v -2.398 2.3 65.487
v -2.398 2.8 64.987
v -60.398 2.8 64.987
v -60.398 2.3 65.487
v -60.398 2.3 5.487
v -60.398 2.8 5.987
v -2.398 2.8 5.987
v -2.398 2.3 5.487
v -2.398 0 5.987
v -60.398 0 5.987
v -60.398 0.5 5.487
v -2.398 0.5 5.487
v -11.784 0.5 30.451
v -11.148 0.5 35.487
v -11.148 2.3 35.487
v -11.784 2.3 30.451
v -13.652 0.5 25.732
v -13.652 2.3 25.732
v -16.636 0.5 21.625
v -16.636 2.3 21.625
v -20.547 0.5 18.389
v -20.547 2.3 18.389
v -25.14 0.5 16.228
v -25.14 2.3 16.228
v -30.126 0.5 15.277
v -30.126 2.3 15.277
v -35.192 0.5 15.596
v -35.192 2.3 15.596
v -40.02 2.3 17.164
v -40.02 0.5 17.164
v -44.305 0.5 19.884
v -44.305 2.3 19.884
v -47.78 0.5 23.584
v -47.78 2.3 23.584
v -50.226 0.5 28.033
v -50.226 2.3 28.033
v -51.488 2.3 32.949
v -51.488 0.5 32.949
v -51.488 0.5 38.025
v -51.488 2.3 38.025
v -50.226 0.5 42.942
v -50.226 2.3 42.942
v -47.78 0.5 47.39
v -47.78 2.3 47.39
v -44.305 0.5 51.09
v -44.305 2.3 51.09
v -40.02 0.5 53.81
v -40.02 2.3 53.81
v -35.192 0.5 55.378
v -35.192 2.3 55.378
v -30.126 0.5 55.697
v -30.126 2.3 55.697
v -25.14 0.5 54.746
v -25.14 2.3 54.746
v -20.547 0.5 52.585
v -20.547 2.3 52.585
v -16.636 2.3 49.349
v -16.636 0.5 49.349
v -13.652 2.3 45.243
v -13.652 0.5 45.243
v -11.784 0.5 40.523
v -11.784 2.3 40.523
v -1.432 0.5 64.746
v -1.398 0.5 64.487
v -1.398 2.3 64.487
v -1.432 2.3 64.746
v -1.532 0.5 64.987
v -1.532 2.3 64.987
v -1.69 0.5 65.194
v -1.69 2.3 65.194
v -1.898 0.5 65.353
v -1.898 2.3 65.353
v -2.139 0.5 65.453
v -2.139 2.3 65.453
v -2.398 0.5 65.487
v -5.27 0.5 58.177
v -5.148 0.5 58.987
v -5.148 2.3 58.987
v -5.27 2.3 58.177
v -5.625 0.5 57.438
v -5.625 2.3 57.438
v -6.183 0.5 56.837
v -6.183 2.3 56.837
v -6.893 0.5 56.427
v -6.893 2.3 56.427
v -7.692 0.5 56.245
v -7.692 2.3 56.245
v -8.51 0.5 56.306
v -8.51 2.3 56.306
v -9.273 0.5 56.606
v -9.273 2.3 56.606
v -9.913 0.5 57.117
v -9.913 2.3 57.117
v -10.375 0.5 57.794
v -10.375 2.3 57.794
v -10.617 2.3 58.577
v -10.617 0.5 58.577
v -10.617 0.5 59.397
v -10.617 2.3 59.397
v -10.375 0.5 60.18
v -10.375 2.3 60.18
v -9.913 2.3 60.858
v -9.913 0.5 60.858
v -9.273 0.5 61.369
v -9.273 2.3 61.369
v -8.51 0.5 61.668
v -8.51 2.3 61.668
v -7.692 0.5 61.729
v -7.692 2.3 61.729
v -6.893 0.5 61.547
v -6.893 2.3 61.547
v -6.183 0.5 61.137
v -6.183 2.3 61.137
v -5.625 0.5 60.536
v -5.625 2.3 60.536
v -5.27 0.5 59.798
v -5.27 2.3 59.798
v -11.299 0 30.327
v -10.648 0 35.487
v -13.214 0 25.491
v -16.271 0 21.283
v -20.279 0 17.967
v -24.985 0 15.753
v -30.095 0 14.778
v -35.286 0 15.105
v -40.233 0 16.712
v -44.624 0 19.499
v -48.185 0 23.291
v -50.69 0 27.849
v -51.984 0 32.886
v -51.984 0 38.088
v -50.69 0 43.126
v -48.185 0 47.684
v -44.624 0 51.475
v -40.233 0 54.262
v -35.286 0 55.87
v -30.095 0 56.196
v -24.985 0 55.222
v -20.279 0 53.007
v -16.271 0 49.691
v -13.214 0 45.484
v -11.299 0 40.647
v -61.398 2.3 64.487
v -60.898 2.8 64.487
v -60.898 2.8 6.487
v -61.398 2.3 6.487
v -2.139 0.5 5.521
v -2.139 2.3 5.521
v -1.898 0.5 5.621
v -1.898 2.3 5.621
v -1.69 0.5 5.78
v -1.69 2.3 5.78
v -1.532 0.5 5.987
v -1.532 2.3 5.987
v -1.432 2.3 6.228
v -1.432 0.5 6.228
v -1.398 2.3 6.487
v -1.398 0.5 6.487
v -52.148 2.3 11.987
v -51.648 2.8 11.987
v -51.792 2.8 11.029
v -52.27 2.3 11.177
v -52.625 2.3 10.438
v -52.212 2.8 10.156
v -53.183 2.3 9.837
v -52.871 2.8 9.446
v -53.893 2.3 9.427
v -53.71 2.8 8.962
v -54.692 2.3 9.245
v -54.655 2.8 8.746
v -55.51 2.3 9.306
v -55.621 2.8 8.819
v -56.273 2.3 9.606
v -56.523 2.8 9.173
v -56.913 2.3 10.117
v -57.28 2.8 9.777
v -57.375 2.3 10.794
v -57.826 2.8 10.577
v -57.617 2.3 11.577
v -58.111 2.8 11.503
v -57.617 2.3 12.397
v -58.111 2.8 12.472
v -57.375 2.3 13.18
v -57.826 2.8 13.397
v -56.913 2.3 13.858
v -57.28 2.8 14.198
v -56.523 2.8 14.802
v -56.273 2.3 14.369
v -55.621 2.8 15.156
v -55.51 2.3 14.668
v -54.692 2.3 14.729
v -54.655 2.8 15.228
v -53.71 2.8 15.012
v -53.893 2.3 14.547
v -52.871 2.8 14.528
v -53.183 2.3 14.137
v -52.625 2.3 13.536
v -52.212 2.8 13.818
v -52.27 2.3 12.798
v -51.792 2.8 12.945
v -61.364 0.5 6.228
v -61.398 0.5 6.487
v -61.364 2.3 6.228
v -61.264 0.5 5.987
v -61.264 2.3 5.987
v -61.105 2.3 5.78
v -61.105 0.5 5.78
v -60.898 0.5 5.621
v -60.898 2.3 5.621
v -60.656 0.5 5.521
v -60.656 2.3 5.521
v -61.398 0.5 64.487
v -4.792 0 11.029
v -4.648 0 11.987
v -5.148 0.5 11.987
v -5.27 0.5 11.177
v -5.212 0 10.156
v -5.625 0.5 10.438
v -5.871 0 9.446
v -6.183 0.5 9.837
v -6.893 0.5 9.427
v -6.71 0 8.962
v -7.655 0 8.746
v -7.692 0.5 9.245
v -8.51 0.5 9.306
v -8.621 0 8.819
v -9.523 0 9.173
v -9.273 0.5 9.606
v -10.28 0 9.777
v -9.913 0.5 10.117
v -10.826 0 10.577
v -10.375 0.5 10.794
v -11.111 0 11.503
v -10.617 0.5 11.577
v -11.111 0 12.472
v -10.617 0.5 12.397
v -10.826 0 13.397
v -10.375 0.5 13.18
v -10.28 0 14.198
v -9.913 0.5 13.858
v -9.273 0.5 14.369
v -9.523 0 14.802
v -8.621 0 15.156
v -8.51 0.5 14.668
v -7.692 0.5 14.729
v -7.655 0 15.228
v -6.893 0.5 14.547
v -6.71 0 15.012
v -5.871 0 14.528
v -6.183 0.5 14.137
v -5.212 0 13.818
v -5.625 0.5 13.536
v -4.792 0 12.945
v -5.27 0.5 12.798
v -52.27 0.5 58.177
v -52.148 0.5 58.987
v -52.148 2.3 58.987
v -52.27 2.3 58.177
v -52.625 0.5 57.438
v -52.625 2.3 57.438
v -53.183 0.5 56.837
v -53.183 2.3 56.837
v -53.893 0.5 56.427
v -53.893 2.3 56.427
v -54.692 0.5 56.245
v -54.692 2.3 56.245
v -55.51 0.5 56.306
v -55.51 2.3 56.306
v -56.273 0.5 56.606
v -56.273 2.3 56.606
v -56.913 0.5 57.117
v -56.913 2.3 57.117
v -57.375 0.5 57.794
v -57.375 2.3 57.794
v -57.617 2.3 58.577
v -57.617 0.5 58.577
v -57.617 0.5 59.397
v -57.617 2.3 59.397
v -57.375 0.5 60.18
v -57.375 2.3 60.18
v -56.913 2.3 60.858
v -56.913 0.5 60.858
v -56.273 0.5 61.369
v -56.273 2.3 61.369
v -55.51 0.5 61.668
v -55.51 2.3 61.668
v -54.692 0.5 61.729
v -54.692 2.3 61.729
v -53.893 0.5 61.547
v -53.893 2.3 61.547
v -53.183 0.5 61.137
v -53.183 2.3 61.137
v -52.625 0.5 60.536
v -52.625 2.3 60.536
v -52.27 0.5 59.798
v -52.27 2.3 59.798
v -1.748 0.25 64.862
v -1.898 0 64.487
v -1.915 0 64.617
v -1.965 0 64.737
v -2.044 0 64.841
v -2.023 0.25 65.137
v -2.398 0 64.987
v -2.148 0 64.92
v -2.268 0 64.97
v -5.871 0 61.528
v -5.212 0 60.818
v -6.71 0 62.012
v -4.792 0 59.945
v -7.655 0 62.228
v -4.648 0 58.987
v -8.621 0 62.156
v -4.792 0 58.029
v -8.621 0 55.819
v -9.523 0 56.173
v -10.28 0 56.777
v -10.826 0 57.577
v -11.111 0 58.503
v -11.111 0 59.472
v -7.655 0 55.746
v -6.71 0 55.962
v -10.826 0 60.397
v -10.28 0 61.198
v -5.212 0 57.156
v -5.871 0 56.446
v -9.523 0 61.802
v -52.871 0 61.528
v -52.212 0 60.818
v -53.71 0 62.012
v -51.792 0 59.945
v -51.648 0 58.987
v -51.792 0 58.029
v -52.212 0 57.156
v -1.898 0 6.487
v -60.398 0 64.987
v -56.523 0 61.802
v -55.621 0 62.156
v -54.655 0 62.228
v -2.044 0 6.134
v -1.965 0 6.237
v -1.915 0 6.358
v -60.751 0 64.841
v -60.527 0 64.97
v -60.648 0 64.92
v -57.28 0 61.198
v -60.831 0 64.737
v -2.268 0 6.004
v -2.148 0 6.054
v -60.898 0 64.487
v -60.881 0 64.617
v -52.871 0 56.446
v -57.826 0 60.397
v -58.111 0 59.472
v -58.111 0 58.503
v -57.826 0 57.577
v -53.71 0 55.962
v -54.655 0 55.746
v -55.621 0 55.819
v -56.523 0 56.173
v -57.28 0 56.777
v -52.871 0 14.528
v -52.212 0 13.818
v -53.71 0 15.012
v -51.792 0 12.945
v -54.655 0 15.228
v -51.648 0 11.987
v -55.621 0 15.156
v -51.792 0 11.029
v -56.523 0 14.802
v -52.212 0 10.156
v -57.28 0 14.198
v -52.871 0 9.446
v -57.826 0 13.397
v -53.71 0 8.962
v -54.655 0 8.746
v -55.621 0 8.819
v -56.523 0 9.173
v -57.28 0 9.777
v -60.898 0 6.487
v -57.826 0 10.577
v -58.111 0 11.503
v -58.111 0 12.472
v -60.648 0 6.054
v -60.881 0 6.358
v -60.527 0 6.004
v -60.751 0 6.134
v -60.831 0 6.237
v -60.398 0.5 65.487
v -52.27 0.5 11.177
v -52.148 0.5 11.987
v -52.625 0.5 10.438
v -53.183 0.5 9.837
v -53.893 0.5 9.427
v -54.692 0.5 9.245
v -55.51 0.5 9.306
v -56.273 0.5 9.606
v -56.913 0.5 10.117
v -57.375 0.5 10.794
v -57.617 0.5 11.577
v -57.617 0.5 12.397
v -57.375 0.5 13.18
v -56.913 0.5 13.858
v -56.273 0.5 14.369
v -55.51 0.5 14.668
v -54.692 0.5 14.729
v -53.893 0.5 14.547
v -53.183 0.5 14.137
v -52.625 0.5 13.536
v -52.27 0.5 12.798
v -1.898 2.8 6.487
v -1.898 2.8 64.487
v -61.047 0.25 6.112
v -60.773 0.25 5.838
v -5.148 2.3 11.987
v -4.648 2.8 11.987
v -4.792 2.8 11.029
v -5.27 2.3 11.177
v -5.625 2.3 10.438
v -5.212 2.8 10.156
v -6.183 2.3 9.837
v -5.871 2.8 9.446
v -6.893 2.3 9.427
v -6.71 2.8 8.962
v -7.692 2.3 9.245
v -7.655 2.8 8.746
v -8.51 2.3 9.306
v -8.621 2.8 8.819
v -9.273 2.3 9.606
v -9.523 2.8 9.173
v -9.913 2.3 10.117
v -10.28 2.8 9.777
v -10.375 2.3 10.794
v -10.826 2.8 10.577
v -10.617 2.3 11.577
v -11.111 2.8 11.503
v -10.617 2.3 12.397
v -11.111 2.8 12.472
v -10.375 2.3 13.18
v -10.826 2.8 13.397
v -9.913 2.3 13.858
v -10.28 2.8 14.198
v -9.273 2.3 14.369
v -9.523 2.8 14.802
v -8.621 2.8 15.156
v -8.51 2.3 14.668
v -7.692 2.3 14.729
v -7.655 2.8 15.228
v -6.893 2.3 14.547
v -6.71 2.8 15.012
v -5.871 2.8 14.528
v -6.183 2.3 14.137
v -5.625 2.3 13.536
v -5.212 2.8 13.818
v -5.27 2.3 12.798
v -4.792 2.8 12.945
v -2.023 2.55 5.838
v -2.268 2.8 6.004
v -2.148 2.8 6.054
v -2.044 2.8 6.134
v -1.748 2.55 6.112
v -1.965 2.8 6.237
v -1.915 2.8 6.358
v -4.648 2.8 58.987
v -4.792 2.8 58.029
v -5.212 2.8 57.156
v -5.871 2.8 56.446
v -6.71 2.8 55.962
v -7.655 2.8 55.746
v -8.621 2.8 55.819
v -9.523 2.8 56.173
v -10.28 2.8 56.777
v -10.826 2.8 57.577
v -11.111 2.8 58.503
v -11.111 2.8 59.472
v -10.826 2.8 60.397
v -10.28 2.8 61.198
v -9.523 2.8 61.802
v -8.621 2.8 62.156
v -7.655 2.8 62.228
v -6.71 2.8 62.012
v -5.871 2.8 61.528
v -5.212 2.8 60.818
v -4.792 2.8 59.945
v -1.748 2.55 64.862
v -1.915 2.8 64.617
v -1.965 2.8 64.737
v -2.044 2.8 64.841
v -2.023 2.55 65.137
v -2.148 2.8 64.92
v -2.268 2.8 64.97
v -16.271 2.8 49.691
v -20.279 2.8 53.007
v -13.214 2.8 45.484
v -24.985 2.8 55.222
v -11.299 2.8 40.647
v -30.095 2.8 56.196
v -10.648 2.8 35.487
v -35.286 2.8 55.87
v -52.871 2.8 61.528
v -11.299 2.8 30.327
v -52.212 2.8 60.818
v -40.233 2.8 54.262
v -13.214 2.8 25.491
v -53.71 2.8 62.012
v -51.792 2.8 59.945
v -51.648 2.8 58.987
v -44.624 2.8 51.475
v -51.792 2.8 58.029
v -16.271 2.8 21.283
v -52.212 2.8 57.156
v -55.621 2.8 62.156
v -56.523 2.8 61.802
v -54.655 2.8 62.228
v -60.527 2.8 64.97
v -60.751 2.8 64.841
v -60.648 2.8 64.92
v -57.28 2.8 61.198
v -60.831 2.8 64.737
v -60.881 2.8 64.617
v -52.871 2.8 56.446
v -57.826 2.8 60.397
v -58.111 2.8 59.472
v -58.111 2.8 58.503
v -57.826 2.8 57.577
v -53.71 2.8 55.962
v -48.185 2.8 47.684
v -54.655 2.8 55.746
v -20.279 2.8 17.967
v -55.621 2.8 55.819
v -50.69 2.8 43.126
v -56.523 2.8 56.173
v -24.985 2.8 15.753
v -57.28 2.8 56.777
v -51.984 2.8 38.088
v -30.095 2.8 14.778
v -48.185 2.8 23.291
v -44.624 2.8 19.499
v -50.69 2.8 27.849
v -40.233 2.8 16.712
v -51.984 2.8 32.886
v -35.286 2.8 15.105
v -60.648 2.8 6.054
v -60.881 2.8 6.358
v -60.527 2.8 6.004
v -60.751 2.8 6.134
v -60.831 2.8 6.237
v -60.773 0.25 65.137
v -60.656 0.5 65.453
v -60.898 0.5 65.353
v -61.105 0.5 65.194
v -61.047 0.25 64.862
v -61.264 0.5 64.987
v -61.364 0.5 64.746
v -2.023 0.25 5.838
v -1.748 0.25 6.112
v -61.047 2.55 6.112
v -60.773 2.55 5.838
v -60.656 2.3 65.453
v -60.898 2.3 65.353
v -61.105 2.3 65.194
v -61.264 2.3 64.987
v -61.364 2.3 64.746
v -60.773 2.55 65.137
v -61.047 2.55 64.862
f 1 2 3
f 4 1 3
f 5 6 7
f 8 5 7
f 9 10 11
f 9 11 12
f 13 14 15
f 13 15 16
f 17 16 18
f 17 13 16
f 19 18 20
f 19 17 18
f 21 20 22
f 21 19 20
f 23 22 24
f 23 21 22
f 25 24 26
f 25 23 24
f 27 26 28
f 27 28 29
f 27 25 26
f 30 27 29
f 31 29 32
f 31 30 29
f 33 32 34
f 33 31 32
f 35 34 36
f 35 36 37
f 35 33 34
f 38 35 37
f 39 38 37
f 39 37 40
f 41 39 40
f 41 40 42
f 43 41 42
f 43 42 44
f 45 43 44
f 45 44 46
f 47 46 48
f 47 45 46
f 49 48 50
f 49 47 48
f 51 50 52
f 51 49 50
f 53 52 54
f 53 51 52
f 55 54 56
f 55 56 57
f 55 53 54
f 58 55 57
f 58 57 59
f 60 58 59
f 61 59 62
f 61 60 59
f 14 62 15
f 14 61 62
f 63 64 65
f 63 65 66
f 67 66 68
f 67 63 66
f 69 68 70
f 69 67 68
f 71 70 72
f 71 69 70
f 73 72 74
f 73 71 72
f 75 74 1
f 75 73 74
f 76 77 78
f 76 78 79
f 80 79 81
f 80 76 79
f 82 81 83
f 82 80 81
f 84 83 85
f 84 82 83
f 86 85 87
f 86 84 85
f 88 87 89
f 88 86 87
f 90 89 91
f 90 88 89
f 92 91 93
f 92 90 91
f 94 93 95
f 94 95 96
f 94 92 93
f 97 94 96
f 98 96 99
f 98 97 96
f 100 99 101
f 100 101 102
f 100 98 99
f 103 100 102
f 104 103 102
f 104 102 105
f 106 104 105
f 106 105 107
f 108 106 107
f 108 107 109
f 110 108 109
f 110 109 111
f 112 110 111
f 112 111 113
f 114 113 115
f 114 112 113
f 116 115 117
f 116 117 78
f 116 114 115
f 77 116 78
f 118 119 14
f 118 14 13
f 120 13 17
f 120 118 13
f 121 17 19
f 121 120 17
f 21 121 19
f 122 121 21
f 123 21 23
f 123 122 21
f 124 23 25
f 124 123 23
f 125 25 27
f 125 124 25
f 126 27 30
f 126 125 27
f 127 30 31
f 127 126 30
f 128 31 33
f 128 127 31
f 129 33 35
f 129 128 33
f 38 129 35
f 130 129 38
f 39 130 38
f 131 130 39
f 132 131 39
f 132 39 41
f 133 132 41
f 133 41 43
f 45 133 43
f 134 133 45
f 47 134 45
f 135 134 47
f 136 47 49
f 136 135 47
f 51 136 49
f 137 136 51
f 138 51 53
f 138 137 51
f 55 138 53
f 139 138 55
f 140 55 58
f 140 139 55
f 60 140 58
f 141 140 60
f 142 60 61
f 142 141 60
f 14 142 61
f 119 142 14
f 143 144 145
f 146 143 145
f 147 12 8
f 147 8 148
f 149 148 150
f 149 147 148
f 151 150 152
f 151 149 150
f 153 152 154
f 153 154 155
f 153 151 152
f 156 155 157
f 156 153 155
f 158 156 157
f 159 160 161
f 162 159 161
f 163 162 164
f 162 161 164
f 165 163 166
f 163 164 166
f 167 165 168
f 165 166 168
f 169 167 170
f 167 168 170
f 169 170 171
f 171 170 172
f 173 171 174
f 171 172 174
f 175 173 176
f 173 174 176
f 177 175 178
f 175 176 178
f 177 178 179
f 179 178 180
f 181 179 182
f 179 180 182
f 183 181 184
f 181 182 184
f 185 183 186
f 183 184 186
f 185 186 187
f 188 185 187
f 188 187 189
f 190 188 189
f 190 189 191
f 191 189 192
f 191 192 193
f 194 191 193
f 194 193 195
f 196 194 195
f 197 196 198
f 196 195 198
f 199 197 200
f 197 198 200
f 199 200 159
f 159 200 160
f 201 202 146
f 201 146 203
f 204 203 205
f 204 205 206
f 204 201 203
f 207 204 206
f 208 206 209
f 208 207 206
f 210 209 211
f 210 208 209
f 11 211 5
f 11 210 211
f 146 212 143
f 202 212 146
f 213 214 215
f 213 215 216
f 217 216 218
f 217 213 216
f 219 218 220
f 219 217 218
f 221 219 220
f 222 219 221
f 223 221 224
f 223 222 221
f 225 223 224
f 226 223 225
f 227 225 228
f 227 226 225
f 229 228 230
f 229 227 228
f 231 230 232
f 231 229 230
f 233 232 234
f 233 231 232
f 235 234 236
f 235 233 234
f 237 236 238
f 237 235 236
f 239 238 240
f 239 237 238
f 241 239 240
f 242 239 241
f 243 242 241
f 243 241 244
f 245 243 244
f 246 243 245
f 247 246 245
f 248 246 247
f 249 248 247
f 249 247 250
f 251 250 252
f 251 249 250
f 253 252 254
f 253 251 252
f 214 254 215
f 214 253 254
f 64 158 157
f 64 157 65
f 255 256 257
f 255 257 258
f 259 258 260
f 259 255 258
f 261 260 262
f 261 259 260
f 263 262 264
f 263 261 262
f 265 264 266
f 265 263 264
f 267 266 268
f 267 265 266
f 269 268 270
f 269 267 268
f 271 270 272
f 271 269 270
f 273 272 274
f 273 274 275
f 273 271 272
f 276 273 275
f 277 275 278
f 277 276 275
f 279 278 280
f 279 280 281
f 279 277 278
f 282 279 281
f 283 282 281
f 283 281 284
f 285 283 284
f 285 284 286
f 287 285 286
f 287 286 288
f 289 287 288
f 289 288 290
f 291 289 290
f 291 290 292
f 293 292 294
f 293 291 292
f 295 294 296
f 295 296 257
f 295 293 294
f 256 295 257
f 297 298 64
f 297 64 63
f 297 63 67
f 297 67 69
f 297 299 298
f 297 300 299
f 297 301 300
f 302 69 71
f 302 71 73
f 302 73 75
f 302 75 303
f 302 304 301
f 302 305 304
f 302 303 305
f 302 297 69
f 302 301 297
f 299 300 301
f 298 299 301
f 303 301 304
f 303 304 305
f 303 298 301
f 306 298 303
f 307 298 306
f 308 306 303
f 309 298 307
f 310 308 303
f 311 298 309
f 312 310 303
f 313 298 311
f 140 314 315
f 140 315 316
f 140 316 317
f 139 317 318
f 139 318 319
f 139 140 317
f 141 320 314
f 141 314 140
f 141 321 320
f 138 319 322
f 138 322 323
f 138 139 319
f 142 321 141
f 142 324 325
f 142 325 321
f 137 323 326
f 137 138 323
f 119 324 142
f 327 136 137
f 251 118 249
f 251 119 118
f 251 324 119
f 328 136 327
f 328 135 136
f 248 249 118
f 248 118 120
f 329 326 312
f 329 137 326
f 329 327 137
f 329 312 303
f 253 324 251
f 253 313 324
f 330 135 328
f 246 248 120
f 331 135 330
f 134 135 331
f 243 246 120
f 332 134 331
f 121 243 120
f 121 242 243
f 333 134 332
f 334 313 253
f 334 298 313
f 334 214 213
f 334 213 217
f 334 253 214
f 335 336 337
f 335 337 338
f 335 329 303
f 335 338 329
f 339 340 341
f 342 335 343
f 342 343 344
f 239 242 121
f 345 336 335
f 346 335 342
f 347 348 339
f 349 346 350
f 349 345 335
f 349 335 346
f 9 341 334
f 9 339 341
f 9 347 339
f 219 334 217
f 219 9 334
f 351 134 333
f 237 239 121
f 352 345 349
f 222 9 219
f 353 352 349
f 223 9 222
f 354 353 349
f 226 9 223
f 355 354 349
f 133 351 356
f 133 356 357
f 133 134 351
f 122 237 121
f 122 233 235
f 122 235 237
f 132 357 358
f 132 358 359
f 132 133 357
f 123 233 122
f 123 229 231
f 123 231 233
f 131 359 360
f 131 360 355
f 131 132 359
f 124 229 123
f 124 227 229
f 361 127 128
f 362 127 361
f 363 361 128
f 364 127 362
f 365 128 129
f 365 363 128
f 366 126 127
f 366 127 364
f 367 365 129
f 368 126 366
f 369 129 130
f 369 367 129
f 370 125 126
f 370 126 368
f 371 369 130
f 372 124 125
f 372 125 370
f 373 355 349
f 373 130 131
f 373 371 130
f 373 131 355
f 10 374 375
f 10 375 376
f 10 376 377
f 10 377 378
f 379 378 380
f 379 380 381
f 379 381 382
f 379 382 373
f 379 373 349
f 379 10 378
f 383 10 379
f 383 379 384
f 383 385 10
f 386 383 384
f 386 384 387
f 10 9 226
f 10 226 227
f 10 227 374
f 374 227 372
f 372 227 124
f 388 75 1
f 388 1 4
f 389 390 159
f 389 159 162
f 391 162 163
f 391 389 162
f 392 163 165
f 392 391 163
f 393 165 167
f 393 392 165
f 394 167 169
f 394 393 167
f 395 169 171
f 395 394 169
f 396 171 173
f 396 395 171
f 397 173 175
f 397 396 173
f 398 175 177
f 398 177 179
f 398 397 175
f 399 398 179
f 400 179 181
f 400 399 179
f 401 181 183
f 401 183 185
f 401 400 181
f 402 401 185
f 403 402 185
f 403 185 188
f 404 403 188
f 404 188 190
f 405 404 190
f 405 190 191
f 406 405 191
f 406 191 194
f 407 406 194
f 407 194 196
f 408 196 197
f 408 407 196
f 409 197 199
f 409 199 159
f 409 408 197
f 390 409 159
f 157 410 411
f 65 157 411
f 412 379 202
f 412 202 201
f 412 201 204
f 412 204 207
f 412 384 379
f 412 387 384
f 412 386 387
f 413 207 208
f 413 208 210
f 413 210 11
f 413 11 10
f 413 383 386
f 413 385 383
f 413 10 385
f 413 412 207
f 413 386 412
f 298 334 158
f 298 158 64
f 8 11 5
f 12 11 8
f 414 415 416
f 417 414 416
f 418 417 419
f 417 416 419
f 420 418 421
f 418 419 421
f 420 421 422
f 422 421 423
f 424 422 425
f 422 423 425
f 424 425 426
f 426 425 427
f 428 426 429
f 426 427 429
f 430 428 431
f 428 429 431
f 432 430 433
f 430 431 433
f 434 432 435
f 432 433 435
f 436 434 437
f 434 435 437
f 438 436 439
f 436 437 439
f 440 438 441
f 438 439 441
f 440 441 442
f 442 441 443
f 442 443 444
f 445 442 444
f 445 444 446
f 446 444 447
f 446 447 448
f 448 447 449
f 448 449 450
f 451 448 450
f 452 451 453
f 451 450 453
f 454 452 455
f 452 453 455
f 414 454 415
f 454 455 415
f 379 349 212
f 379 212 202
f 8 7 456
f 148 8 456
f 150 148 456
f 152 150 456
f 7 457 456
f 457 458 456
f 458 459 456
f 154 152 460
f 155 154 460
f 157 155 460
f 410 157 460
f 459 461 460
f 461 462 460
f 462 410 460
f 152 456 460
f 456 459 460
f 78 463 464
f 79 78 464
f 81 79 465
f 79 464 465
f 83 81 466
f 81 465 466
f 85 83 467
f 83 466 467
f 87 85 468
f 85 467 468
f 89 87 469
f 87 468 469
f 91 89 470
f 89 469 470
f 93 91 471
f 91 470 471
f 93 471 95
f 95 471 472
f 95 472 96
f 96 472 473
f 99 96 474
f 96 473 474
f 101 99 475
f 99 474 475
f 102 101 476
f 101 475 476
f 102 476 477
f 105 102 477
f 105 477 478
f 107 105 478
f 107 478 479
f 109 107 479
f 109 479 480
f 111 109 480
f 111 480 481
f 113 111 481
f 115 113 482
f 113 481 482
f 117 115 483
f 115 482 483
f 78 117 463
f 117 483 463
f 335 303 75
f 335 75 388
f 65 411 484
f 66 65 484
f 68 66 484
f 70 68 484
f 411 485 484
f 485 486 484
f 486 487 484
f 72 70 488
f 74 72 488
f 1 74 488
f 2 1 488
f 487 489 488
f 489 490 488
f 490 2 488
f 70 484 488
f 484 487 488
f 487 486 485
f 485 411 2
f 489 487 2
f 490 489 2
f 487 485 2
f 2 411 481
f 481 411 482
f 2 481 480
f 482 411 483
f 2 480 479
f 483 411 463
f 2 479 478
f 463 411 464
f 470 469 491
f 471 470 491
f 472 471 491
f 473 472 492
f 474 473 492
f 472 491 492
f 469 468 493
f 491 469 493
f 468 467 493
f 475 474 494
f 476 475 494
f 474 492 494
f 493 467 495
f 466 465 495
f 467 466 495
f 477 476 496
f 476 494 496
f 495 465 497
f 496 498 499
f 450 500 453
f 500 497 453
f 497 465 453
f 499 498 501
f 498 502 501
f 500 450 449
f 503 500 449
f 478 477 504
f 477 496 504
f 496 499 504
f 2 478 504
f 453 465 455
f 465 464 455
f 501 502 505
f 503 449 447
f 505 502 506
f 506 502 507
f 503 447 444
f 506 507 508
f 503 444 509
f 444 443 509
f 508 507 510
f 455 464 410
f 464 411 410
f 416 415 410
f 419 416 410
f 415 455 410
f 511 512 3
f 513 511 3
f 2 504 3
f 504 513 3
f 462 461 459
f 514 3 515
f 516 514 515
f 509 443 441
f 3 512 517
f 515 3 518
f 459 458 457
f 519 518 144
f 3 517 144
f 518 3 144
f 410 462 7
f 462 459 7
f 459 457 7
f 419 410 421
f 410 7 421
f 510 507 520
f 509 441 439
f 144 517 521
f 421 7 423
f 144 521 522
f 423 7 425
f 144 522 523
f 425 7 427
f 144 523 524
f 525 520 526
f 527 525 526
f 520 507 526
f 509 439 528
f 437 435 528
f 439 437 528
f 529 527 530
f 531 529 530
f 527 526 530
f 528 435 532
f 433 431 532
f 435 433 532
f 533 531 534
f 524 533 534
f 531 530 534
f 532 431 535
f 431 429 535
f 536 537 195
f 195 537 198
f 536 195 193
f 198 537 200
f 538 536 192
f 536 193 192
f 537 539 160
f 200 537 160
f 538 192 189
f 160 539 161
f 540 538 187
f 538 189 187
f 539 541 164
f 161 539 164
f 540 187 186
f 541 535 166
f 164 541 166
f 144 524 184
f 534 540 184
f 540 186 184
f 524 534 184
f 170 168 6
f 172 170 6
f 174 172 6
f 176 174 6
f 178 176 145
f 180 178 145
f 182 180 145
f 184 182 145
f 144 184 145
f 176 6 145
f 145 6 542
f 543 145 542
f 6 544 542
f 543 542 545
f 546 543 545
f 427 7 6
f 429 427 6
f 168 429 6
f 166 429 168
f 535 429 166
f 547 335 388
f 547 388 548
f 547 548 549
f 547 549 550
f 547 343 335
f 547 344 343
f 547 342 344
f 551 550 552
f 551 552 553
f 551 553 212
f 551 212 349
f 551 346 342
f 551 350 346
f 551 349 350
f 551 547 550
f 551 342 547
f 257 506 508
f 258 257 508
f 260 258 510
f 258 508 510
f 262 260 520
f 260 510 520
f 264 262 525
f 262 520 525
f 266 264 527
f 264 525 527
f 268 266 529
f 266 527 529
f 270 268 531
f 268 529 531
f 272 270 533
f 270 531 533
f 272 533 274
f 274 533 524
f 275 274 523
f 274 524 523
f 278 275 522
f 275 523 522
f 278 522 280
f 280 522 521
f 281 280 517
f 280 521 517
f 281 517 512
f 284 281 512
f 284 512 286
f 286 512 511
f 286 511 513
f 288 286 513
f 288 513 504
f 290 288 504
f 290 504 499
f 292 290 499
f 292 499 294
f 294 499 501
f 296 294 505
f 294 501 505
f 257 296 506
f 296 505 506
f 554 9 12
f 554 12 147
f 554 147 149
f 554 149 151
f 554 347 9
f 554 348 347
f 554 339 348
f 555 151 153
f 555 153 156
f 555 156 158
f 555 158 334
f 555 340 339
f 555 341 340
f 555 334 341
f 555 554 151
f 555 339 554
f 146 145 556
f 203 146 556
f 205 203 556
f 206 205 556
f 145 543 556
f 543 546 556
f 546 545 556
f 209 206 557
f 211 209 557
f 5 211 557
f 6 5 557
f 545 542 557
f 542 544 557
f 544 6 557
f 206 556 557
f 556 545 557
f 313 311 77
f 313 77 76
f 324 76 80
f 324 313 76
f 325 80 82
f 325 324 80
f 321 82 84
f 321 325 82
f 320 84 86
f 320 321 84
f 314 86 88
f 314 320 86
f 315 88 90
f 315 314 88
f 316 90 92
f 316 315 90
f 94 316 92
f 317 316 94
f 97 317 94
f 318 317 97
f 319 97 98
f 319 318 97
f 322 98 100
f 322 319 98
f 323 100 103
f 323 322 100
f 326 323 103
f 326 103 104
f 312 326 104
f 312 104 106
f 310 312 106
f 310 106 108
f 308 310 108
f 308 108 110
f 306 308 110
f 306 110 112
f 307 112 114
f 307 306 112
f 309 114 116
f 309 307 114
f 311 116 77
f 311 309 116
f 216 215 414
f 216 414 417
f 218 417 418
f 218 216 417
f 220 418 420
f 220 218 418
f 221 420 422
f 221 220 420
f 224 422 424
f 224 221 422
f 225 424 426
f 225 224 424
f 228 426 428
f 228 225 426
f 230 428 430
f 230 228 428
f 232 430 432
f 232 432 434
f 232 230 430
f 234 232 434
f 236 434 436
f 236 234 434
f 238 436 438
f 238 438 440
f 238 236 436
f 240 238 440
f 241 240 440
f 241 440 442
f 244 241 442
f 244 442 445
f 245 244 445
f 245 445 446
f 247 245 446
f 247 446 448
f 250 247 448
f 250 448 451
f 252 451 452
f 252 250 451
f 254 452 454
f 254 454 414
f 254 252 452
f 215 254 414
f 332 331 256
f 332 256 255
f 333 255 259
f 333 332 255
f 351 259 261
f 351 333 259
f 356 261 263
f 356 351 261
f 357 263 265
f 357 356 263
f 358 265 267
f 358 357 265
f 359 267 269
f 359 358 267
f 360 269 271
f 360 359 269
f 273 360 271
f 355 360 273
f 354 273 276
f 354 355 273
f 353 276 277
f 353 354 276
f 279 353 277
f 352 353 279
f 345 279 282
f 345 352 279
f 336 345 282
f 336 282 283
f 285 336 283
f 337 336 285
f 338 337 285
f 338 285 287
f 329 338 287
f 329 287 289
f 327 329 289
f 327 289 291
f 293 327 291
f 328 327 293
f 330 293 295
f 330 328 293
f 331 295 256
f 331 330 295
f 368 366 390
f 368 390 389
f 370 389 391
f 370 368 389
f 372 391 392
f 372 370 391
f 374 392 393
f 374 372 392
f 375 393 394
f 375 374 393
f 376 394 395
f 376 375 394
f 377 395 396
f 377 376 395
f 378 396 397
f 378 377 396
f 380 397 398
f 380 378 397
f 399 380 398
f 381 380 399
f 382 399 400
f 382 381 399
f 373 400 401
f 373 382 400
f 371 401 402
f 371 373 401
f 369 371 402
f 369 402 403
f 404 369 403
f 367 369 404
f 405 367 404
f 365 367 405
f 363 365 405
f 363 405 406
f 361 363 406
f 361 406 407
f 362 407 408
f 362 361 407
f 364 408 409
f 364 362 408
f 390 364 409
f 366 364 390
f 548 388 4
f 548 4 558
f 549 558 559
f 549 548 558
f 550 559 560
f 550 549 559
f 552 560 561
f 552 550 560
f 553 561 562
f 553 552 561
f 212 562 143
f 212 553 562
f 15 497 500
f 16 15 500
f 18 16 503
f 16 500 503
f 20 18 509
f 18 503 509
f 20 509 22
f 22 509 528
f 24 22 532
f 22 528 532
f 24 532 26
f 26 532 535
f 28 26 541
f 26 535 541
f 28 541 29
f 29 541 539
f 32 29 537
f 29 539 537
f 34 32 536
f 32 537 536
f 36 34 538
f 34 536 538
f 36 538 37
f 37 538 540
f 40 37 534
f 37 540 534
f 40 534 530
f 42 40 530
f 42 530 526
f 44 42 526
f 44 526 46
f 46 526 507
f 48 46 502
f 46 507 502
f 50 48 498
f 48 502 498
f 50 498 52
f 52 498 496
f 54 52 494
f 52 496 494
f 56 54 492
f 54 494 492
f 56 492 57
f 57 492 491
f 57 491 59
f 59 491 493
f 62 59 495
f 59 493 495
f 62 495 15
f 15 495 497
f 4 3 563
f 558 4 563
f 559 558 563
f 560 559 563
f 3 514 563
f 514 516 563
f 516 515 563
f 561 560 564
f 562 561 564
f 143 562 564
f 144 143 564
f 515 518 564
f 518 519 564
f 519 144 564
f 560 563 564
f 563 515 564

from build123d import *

# Parameters (mm, degrees)
SKETCH1_R           = 20.25
SKETCH1_R_2         = 2.75
BOSS_EXTRUDE1_DEPTH = 2.8
CHAMFER1_SIZE       = 0.5


with BuildPart() as part:
    # Sketch1 → Boss-Extrude1 (new body)
    with BuildSketch(Plane(origin=(0, 0, 0), x_dir=(1, 0, 0), z_dir=(0, 1, 0))):
        with BuildLine():
            Line((-2.397592731, -65.487125506), (-60.397592731, -65.487125506))
            ThreePointArc((-60.397592731, -65.487125506), (-61.104699513, -65.194232288), (-61.397592731, -64.487125506))
            Line((-61.397592731, -64.487125506), (-61.397592731, -6.487125506))
            ThreePointArc((-61.397592731, -6.487125506), (-61.104699513, -5.780018725), (-60.397592731, -5.487125506))
            Line((-60.397592731, -5.487125506), (-2.397592731, -5.487125506))
            ThreePointArc((-2.397592731, -5.487125506), (-1.69048595, -5.780018725), (-1.397592731, -6.487125506))
            Line((-1.397592731, -6.487125506), (-1.397592731, -64.487125506))
            ThreePointArc((-1.397592731, -64.487125506), (-1.69048595, -65.194232288), (-2.397592731, -65.487125506))
        make_face()
        with Locations((-31.397592731, -35.487125506)):
            Circle(SKETCH1_R, mode=Mode.SUBTRACT)
        with Locations((-54.897592731, -11.987125506)):
            Circle(SKETCH1_R_2, mode=Mode.SUBTRACT)
        with Locations((-7.897592731, -11.987125506)):
            Circle(SKETCH1_R_2, mode=Mode.SUBTRACT)
        with Locations((-7.897592731, -58.987125506)):
            Circle(SKETCH1_R_2, mode=Mode.SUBTRACT)
        with Locations((-54.897592731, -58.987125506)):
            Circle(SKETCH1_R_2, mode=Mode.SUBTRACT)
    extrude(amount=BOSS_EXTRUDE1_DEPTH)

    # Chamfer1
    chamfer1_edges = [part.edges().sort_by_distance(p)[0] for p in [
        (-1.397592731, 0, 35.487125506),
        (-1.69048595, 0, 65.194232288),
        (-31.397592731, 0, 65.487125506),
        (-61.104699513, 0, 65.194232288),
        (-1.69048595, 2.8, 65.194232288),
        (-1.397592731, 2.8, 35.487125506),
        (-1.69048595, 2.8, 5.780018725),
        (-51.647592731, 0, 35.487125506),
        (-51.647592731, 2.8, 35.487125506),
        (-31.397592731, 2.8, 5.487125506),
        (-57.647592731, 0, 11.987125506),
        (-57.647592731, 2.8, 11.987125506),
        (-61.104699513, 2.8, 5.780018725),
        (-10.647592731, 0, 11.987125506),
        (-10.647592731, 2.8, 11.987125506),
        (-61.397592731, 2.8, 35.487125506),
        (-10.647592731, 0, 58.987125506),
        (-10.647592731, 2.8, 58.987125506),
        (-57.647592731, 0, 58.987125506),
        (-57.647592731, 2.8, 58.987125506),
        (-61.104699513, 2.8, 65.194232288),
        (-61.397592731, 0, 35.487125506),
        (-31.397592731, 2.8, 65.487125506),
        (-61.104699513, 0, 5.780018725),
        (-31.397592731, 0, 5.487125506),
        (-1.69048595, 0, 5.780018725),
    ]]
    chamfer(chamfer1_edges, length=CHAMFER1_SIZE)


solid = part.part
